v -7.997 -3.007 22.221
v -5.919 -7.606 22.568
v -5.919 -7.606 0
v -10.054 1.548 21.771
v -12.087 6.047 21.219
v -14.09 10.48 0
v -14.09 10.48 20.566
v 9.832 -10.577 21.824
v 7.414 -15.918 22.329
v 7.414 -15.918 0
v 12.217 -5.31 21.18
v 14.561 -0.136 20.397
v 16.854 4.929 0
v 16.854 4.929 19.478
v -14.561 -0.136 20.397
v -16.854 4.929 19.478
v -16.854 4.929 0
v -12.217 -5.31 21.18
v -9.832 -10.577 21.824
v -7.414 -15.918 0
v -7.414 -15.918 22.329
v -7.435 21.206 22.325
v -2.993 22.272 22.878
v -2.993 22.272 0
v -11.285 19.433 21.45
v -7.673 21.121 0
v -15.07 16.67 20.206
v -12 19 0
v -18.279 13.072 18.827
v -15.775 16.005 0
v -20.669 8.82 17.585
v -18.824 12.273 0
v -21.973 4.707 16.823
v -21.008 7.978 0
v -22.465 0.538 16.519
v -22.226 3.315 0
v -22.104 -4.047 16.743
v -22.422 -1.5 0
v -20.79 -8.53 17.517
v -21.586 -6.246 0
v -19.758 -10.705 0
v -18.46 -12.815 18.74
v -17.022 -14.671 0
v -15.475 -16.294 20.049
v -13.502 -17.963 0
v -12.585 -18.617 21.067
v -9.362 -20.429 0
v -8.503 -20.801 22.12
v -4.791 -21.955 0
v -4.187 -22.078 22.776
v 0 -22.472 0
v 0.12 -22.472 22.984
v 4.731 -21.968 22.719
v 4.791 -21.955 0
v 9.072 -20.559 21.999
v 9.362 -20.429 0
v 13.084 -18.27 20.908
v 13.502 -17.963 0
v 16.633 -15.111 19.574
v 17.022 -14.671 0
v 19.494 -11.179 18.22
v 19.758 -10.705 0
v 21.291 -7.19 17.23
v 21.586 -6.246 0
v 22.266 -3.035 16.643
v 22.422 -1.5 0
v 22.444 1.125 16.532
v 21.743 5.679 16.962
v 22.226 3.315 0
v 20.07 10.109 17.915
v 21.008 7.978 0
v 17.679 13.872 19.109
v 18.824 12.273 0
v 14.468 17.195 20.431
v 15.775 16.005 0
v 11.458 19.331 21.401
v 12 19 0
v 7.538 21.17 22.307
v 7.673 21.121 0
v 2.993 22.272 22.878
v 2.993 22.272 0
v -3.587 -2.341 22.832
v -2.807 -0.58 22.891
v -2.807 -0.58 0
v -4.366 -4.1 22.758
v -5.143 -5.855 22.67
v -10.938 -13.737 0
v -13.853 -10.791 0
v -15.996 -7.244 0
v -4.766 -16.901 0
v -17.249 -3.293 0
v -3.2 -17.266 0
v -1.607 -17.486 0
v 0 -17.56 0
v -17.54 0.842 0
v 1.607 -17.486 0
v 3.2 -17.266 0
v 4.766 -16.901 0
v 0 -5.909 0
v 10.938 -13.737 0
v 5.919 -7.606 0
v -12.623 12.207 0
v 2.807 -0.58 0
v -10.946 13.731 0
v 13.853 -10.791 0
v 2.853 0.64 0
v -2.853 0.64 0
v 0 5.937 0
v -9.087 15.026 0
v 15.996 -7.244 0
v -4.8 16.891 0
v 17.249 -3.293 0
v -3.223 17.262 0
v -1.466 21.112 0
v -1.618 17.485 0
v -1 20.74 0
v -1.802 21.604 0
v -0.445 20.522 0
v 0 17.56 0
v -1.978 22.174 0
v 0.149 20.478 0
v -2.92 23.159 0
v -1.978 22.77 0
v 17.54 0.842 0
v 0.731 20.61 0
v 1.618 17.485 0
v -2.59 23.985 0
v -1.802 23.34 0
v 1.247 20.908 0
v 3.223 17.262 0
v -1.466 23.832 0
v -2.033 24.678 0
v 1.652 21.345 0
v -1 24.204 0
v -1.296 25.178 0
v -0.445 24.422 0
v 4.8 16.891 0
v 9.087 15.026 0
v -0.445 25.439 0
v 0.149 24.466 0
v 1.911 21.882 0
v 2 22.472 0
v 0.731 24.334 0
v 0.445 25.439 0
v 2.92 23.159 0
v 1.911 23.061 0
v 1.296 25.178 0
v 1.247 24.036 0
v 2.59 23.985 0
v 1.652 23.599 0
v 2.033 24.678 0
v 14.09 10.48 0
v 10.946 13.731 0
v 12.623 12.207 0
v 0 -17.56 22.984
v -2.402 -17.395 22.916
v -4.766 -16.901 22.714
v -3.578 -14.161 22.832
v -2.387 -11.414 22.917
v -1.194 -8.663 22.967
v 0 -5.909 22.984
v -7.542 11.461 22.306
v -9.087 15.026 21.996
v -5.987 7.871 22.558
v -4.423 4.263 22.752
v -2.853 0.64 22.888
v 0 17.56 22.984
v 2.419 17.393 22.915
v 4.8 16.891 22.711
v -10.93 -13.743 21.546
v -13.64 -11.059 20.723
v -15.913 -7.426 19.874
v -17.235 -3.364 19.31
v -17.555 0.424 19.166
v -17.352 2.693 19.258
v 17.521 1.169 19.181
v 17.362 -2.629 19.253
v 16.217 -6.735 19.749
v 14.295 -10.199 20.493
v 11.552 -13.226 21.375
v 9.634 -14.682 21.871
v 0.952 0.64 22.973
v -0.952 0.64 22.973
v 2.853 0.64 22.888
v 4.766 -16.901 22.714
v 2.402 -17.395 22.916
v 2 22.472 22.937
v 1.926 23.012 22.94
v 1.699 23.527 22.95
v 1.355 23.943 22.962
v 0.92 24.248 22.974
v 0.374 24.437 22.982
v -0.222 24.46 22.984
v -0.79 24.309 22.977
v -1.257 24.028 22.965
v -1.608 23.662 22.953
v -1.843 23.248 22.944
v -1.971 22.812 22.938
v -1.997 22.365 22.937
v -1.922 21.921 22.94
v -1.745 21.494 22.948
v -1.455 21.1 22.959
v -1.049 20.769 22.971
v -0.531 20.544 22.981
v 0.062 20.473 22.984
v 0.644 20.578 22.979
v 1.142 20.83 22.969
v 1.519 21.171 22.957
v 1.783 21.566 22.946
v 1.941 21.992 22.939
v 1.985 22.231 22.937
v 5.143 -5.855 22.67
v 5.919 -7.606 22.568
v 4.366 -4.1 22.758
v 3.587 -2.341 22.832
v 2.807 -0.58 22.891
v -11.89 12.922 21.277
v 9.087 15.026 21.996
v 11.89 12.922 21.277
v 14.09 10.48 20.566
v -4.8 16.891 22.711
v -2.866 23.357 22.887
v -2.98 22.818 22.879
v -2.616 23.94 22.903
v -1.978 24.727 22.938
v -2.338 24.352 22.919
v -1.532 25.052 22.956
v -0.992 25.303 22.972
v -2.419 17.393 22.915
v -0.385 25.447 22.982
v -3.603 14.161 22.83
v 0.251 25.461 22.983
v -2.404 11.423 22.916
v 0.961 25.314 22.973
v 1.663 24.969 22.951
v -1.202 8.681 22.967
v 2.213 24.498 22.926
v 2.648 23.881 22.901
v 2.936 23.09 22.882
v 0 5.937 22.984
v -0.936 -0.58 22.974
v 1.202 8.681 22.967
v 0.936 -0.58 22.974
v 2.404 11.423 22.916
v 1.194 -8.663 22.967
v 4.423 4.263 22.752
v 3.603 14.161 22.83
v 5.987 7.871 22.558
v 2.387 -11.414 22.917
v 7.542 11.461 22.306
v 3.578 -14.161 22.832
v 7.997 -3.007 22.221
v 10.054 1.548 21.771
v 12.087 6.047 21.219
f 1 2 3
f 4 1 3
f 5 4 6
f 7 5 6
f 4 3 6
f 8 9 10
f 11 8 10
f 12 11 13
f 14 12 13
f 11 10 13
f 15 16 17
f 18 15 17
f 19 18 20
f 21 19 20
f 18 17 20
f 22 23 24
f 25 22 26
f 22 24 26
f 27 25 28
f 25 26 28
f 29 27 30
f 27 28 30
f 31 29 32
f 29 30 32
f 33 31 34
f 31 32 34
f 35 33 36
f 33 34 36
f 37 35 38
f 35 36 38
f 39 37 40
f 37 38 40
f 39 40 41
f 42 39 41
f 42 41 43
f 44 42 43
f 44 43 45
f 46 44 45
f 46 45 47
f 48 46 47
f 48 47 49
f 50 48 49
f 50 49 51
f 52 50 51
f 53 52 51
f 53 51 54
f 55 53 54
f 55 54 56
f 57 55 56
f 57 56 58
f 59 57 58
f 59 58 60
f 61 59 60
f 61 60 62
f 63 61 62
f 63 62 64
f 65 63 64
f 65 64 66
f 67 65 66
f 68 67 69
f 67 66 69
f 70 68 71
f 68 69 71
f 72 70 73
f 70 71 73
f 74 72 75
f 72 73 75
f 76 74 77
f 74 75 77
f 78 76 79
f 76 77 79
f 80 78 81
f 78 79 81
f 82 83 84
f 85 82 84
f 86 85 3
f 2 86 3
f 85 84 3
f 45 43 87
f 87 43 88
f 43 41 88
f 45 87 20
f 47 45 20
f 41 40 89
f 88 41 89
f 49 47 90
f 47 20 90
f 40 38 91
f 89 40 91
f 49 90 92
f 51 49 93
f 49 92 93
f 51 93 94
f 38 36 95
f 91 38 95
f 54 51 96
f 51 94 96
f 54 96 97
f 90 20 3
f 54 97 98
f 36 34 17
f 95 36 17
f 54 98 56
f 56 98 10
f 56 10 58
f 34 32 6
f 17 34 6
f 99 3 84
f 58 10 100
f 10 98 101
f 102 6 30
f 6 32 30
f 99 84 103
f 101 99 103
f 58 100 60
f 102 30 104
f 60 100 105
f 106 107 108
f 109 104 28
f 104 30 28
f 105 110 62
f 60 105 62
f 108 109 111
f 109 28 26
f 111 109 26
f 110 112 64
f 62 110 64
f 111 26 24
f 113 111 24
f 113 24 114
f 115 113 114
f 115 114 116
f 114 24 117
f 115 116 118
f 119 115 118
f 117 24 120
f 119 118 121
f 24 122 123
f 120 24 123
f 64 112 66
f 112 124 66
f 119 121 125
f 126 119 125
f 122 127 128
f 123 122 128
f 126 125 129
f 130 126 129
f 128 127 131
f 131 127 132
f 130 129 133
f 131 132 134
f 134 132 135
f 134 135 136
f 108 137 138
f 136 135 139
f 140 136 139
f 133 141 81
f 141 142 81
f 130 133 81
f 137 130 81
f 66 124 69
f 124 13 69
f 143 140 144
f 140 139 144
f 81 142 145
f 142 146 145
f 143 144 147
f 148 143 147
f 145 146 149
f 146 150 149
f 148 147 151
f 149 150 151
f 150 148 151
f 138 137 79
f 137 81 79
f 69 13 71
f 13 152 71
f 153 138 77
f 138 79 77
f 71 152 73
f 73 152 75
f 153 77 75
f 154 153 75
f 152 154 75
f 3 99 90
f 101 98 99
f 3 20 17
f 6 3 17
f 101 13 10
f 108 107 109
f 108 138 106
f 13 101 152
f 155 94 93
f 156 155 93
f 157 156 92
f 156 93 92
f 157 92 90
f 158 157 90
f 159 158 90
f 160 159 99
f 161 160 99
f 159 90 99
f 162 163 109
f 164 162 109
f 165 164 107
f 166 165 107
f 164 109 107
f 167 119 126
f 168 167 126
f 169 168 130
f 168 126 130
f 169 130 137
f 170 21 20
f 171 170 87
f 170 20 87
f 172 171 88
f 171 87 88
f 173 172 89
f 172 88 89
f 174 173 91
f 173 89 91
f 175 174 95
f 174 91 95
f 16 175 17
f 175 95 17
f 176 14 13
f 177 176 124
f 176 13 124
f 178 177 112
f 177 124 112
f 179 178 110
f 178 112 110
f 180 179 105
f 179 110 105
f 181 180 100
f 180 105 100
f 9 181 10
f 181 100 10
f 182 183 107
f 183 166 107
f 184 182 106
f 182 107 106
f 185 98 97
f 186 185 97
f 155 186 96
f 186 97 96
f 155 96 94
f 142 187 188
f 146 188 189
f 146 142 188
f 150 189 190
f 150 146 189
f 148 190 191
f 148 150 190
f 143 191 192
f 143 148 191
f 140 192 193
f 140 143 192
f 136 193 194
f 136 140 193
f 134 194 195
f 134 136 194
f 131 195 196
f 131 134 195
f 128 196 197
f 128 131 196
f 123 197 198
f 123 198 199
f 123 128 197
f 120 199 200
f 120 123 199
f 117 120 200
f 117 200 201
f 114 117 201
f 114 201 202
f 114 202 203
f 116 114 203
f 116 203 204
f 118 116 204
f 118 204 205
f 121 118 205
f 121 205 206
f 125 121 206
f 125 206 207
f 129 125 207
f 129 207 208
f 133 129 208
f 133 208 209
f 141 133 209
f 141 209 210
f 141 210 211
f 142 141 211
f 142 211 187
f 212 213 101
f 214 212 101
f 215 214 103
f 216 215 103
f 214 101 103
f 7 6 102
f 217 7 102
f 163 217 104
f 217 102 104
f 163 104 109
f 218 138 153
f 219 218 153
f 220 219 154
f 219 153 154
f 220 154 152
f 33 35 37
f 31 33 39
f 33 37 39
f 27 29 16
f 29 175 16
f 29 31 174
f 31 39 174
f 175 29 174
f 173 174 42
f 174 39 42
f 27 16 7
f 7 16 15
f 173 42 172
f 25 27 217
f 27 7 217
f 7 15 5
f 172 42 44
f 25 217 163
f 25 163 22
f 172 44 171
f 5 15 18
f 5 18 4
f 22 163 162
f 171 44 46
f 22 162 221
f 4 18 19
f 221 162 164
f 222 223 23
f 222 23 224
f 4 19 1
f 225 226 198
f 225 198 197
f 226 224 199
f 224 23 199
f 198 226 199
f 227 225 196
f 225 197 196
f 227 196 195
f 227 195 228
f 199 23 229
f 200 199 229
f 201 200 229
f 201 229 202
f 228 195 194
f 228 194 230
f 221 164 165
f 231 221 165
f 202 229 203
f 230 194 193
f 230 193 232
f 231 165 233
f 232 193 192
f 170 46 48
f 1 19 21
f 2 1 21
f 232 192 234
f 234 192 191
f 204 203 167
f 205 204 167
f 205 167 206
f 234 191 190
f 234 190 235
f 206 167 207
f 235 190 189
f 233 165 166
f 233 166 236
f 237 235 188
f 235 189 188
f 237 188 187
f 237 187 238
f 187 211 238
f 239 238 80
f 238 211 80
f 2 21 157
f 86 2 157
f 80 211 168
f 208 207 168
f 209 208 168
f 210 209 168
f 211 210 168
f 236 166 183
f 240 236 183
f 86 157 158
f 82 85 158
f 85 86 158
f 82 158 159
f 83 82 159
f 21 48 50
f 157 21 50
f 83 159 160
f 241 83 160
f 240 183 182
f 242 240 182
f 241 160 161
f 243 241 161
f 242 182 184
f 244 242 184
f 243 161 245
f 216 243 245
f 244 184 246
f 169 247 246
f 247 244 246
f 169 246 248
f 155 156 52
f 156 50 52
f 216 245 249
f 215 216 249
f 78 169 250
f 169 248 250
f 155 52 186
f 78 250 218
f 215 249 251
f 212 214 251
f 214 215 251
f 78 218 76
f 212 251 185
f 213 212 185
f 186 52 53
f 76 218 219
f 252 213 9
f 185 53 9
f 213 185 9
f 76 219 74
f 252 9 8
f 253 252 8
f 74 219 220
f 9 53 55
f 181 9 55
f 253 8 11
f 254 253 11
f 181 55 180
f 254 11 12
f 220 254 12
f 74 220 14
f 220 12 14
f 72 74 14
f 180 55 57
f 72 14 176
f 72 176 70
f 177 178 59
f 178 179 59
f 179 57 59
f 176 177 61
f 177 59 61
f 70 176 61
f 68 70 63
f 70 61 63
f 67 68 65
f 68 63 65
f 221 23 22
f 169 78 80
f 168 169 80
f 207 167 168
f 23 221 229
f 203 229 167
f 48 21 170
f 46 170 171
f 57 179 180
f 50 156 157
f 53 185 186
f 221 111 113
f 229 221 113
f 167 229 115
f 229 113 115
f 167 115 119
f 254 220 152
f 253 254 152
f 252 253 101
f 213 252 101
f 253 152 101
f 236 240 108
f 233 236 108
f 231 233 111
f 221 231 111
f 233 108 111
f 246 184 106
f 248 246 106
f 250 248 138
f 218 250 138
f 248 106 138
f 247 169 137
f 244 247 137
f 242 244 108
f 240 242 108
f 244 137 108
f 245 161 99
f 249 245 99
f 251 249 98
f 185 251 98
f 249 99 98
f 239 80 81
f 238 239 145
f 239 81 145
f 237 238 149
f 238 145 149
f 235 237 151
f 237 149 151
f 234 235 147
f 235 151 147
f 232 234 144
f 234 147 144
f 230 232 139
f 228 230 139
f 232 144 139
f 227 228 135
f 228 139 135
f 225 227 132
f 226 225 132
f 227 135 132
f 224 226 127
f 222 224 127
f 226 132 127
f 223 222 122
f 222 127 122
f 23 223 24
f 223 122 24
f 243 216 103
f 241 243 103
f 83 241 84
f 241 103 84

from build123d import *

# Parameters (mm, degrees)
F0_R     = 2
F1_DEPTH = 25
F3_DEPTH = 29.5


with BuildPart() as f1:
    # F0 (on Top) → F1 (new body)
    with BuildSketch(Plane.XY):
        with BuildLine():
            ThreePointArc((2.993309, 22.271687), (0, 25.471937), (-2.993309, 22.271687))
            ThreePointArc((-2.993309, 22.271687), (0, -22.471937), (2.993309, 22.271687))
        make_face()
        with BuildLine():
            Line((-4.766043, -16.90091), (0, -5.909285))
            Line((0, -5.909285), (4.766043, -16.90091))
            ThreePointArc((4.766043, -16.90091), (2.405704, -17.394496), (0, -17.560066))
            ThreePointArc((0, -17.560066), (-2.405704, -17.394496), (-4.766043, -16.90091))
        make_face(mode=Mode.SUBTRACT)
        with BuildLine():
            ThreePointArc((-7.413827, -15.918262), (-15.996416, -7.243657), (-16.854101, 4.929016))
            Line((-16.854101, 4.929016), (-7.413827, -15.918262))
        make_face(mode=Mode.SUBTRACT)
        with BuildLine():
            Line((7.413827, -15.918262), (16.854101, 4.929016))
            ThreePointArc((16.854101, 4.929016), (15.996416, -7.243657), (7.413827, -15.918262))
        make_face(mode=Mode.SUBTRACT)
        with BuildLine():
            ThreePointArc((-14.089574, 10.480449), (-11.809122, 12.996175), (-9.08713, 15.025977))
            Line((-9.08713, 15.025977), (-2.853133, 0.640048))
            Line((-2.853133, 0.640048), (0, 0.640048))
            Line((0, 0.640048), (2.853133, 0.640048))
            Line((2.853133, 0.640048), (9.08713, 15.025977))
            ThreePointArc((9.08713, 15.025977), (11.809122, 12.996175), (14.089574, 10.480449))
            Line((14.089574, 10.480449), (5.919134, -7.606121))
            Line((5.919134, -7.606121), (2.806974, -0.579698))
            Line((2.806974, -0.579698), (0, -0.579698))
            Line((0, -0.579698), (-2.806974, -0.579698))
            Line((-2.806974, -0.579698), (-5.919134, -7.606121))
            Line((-5.919134, -7.606121), (-14.089574, 10.480449))
        make_face(mode=Mode.SUBTRACT)
        with BuildLine():
            Line((0, 5.937309), (-4.799841, 16.891342))
            ThreePointArc((-4.799841, 16.891342), (-2.423101, 17.392081), (0, 17.560066))
            ThreePointArc((0, 17.560066), (2.423101, 17.392081), (4.799841, 16.891342))
            Line((4.799841, 16.891342), (0, 5.937309))
        make_face(mode=Mode.SUBTRACT)
        with Locations((0, 22.471937)):
            Circle(F0_R, mode=Mode.SUBTRACT)
    extrude(amount=F1_DEPTH)

    # F2 (on Front) → F3 (cut, symmetric)
    with BuildSketch(Plane.XZ):
        with BuildLine():
            ThreePointArc((-25, 14.797118), (0, 22.984089), (25, 14.797118))
            Line((25, 14.797118), (25.056494, 26.376059))
            Line((25.056494, 26.376059), (-25, 26.376059))
            Line((-25, 26.376059), (-25, 14.797118))
        make_face()
    extrude(amount=F3_DEPTH, both=True, mode=Mode.SUBTRACT)


solid = f1.part
